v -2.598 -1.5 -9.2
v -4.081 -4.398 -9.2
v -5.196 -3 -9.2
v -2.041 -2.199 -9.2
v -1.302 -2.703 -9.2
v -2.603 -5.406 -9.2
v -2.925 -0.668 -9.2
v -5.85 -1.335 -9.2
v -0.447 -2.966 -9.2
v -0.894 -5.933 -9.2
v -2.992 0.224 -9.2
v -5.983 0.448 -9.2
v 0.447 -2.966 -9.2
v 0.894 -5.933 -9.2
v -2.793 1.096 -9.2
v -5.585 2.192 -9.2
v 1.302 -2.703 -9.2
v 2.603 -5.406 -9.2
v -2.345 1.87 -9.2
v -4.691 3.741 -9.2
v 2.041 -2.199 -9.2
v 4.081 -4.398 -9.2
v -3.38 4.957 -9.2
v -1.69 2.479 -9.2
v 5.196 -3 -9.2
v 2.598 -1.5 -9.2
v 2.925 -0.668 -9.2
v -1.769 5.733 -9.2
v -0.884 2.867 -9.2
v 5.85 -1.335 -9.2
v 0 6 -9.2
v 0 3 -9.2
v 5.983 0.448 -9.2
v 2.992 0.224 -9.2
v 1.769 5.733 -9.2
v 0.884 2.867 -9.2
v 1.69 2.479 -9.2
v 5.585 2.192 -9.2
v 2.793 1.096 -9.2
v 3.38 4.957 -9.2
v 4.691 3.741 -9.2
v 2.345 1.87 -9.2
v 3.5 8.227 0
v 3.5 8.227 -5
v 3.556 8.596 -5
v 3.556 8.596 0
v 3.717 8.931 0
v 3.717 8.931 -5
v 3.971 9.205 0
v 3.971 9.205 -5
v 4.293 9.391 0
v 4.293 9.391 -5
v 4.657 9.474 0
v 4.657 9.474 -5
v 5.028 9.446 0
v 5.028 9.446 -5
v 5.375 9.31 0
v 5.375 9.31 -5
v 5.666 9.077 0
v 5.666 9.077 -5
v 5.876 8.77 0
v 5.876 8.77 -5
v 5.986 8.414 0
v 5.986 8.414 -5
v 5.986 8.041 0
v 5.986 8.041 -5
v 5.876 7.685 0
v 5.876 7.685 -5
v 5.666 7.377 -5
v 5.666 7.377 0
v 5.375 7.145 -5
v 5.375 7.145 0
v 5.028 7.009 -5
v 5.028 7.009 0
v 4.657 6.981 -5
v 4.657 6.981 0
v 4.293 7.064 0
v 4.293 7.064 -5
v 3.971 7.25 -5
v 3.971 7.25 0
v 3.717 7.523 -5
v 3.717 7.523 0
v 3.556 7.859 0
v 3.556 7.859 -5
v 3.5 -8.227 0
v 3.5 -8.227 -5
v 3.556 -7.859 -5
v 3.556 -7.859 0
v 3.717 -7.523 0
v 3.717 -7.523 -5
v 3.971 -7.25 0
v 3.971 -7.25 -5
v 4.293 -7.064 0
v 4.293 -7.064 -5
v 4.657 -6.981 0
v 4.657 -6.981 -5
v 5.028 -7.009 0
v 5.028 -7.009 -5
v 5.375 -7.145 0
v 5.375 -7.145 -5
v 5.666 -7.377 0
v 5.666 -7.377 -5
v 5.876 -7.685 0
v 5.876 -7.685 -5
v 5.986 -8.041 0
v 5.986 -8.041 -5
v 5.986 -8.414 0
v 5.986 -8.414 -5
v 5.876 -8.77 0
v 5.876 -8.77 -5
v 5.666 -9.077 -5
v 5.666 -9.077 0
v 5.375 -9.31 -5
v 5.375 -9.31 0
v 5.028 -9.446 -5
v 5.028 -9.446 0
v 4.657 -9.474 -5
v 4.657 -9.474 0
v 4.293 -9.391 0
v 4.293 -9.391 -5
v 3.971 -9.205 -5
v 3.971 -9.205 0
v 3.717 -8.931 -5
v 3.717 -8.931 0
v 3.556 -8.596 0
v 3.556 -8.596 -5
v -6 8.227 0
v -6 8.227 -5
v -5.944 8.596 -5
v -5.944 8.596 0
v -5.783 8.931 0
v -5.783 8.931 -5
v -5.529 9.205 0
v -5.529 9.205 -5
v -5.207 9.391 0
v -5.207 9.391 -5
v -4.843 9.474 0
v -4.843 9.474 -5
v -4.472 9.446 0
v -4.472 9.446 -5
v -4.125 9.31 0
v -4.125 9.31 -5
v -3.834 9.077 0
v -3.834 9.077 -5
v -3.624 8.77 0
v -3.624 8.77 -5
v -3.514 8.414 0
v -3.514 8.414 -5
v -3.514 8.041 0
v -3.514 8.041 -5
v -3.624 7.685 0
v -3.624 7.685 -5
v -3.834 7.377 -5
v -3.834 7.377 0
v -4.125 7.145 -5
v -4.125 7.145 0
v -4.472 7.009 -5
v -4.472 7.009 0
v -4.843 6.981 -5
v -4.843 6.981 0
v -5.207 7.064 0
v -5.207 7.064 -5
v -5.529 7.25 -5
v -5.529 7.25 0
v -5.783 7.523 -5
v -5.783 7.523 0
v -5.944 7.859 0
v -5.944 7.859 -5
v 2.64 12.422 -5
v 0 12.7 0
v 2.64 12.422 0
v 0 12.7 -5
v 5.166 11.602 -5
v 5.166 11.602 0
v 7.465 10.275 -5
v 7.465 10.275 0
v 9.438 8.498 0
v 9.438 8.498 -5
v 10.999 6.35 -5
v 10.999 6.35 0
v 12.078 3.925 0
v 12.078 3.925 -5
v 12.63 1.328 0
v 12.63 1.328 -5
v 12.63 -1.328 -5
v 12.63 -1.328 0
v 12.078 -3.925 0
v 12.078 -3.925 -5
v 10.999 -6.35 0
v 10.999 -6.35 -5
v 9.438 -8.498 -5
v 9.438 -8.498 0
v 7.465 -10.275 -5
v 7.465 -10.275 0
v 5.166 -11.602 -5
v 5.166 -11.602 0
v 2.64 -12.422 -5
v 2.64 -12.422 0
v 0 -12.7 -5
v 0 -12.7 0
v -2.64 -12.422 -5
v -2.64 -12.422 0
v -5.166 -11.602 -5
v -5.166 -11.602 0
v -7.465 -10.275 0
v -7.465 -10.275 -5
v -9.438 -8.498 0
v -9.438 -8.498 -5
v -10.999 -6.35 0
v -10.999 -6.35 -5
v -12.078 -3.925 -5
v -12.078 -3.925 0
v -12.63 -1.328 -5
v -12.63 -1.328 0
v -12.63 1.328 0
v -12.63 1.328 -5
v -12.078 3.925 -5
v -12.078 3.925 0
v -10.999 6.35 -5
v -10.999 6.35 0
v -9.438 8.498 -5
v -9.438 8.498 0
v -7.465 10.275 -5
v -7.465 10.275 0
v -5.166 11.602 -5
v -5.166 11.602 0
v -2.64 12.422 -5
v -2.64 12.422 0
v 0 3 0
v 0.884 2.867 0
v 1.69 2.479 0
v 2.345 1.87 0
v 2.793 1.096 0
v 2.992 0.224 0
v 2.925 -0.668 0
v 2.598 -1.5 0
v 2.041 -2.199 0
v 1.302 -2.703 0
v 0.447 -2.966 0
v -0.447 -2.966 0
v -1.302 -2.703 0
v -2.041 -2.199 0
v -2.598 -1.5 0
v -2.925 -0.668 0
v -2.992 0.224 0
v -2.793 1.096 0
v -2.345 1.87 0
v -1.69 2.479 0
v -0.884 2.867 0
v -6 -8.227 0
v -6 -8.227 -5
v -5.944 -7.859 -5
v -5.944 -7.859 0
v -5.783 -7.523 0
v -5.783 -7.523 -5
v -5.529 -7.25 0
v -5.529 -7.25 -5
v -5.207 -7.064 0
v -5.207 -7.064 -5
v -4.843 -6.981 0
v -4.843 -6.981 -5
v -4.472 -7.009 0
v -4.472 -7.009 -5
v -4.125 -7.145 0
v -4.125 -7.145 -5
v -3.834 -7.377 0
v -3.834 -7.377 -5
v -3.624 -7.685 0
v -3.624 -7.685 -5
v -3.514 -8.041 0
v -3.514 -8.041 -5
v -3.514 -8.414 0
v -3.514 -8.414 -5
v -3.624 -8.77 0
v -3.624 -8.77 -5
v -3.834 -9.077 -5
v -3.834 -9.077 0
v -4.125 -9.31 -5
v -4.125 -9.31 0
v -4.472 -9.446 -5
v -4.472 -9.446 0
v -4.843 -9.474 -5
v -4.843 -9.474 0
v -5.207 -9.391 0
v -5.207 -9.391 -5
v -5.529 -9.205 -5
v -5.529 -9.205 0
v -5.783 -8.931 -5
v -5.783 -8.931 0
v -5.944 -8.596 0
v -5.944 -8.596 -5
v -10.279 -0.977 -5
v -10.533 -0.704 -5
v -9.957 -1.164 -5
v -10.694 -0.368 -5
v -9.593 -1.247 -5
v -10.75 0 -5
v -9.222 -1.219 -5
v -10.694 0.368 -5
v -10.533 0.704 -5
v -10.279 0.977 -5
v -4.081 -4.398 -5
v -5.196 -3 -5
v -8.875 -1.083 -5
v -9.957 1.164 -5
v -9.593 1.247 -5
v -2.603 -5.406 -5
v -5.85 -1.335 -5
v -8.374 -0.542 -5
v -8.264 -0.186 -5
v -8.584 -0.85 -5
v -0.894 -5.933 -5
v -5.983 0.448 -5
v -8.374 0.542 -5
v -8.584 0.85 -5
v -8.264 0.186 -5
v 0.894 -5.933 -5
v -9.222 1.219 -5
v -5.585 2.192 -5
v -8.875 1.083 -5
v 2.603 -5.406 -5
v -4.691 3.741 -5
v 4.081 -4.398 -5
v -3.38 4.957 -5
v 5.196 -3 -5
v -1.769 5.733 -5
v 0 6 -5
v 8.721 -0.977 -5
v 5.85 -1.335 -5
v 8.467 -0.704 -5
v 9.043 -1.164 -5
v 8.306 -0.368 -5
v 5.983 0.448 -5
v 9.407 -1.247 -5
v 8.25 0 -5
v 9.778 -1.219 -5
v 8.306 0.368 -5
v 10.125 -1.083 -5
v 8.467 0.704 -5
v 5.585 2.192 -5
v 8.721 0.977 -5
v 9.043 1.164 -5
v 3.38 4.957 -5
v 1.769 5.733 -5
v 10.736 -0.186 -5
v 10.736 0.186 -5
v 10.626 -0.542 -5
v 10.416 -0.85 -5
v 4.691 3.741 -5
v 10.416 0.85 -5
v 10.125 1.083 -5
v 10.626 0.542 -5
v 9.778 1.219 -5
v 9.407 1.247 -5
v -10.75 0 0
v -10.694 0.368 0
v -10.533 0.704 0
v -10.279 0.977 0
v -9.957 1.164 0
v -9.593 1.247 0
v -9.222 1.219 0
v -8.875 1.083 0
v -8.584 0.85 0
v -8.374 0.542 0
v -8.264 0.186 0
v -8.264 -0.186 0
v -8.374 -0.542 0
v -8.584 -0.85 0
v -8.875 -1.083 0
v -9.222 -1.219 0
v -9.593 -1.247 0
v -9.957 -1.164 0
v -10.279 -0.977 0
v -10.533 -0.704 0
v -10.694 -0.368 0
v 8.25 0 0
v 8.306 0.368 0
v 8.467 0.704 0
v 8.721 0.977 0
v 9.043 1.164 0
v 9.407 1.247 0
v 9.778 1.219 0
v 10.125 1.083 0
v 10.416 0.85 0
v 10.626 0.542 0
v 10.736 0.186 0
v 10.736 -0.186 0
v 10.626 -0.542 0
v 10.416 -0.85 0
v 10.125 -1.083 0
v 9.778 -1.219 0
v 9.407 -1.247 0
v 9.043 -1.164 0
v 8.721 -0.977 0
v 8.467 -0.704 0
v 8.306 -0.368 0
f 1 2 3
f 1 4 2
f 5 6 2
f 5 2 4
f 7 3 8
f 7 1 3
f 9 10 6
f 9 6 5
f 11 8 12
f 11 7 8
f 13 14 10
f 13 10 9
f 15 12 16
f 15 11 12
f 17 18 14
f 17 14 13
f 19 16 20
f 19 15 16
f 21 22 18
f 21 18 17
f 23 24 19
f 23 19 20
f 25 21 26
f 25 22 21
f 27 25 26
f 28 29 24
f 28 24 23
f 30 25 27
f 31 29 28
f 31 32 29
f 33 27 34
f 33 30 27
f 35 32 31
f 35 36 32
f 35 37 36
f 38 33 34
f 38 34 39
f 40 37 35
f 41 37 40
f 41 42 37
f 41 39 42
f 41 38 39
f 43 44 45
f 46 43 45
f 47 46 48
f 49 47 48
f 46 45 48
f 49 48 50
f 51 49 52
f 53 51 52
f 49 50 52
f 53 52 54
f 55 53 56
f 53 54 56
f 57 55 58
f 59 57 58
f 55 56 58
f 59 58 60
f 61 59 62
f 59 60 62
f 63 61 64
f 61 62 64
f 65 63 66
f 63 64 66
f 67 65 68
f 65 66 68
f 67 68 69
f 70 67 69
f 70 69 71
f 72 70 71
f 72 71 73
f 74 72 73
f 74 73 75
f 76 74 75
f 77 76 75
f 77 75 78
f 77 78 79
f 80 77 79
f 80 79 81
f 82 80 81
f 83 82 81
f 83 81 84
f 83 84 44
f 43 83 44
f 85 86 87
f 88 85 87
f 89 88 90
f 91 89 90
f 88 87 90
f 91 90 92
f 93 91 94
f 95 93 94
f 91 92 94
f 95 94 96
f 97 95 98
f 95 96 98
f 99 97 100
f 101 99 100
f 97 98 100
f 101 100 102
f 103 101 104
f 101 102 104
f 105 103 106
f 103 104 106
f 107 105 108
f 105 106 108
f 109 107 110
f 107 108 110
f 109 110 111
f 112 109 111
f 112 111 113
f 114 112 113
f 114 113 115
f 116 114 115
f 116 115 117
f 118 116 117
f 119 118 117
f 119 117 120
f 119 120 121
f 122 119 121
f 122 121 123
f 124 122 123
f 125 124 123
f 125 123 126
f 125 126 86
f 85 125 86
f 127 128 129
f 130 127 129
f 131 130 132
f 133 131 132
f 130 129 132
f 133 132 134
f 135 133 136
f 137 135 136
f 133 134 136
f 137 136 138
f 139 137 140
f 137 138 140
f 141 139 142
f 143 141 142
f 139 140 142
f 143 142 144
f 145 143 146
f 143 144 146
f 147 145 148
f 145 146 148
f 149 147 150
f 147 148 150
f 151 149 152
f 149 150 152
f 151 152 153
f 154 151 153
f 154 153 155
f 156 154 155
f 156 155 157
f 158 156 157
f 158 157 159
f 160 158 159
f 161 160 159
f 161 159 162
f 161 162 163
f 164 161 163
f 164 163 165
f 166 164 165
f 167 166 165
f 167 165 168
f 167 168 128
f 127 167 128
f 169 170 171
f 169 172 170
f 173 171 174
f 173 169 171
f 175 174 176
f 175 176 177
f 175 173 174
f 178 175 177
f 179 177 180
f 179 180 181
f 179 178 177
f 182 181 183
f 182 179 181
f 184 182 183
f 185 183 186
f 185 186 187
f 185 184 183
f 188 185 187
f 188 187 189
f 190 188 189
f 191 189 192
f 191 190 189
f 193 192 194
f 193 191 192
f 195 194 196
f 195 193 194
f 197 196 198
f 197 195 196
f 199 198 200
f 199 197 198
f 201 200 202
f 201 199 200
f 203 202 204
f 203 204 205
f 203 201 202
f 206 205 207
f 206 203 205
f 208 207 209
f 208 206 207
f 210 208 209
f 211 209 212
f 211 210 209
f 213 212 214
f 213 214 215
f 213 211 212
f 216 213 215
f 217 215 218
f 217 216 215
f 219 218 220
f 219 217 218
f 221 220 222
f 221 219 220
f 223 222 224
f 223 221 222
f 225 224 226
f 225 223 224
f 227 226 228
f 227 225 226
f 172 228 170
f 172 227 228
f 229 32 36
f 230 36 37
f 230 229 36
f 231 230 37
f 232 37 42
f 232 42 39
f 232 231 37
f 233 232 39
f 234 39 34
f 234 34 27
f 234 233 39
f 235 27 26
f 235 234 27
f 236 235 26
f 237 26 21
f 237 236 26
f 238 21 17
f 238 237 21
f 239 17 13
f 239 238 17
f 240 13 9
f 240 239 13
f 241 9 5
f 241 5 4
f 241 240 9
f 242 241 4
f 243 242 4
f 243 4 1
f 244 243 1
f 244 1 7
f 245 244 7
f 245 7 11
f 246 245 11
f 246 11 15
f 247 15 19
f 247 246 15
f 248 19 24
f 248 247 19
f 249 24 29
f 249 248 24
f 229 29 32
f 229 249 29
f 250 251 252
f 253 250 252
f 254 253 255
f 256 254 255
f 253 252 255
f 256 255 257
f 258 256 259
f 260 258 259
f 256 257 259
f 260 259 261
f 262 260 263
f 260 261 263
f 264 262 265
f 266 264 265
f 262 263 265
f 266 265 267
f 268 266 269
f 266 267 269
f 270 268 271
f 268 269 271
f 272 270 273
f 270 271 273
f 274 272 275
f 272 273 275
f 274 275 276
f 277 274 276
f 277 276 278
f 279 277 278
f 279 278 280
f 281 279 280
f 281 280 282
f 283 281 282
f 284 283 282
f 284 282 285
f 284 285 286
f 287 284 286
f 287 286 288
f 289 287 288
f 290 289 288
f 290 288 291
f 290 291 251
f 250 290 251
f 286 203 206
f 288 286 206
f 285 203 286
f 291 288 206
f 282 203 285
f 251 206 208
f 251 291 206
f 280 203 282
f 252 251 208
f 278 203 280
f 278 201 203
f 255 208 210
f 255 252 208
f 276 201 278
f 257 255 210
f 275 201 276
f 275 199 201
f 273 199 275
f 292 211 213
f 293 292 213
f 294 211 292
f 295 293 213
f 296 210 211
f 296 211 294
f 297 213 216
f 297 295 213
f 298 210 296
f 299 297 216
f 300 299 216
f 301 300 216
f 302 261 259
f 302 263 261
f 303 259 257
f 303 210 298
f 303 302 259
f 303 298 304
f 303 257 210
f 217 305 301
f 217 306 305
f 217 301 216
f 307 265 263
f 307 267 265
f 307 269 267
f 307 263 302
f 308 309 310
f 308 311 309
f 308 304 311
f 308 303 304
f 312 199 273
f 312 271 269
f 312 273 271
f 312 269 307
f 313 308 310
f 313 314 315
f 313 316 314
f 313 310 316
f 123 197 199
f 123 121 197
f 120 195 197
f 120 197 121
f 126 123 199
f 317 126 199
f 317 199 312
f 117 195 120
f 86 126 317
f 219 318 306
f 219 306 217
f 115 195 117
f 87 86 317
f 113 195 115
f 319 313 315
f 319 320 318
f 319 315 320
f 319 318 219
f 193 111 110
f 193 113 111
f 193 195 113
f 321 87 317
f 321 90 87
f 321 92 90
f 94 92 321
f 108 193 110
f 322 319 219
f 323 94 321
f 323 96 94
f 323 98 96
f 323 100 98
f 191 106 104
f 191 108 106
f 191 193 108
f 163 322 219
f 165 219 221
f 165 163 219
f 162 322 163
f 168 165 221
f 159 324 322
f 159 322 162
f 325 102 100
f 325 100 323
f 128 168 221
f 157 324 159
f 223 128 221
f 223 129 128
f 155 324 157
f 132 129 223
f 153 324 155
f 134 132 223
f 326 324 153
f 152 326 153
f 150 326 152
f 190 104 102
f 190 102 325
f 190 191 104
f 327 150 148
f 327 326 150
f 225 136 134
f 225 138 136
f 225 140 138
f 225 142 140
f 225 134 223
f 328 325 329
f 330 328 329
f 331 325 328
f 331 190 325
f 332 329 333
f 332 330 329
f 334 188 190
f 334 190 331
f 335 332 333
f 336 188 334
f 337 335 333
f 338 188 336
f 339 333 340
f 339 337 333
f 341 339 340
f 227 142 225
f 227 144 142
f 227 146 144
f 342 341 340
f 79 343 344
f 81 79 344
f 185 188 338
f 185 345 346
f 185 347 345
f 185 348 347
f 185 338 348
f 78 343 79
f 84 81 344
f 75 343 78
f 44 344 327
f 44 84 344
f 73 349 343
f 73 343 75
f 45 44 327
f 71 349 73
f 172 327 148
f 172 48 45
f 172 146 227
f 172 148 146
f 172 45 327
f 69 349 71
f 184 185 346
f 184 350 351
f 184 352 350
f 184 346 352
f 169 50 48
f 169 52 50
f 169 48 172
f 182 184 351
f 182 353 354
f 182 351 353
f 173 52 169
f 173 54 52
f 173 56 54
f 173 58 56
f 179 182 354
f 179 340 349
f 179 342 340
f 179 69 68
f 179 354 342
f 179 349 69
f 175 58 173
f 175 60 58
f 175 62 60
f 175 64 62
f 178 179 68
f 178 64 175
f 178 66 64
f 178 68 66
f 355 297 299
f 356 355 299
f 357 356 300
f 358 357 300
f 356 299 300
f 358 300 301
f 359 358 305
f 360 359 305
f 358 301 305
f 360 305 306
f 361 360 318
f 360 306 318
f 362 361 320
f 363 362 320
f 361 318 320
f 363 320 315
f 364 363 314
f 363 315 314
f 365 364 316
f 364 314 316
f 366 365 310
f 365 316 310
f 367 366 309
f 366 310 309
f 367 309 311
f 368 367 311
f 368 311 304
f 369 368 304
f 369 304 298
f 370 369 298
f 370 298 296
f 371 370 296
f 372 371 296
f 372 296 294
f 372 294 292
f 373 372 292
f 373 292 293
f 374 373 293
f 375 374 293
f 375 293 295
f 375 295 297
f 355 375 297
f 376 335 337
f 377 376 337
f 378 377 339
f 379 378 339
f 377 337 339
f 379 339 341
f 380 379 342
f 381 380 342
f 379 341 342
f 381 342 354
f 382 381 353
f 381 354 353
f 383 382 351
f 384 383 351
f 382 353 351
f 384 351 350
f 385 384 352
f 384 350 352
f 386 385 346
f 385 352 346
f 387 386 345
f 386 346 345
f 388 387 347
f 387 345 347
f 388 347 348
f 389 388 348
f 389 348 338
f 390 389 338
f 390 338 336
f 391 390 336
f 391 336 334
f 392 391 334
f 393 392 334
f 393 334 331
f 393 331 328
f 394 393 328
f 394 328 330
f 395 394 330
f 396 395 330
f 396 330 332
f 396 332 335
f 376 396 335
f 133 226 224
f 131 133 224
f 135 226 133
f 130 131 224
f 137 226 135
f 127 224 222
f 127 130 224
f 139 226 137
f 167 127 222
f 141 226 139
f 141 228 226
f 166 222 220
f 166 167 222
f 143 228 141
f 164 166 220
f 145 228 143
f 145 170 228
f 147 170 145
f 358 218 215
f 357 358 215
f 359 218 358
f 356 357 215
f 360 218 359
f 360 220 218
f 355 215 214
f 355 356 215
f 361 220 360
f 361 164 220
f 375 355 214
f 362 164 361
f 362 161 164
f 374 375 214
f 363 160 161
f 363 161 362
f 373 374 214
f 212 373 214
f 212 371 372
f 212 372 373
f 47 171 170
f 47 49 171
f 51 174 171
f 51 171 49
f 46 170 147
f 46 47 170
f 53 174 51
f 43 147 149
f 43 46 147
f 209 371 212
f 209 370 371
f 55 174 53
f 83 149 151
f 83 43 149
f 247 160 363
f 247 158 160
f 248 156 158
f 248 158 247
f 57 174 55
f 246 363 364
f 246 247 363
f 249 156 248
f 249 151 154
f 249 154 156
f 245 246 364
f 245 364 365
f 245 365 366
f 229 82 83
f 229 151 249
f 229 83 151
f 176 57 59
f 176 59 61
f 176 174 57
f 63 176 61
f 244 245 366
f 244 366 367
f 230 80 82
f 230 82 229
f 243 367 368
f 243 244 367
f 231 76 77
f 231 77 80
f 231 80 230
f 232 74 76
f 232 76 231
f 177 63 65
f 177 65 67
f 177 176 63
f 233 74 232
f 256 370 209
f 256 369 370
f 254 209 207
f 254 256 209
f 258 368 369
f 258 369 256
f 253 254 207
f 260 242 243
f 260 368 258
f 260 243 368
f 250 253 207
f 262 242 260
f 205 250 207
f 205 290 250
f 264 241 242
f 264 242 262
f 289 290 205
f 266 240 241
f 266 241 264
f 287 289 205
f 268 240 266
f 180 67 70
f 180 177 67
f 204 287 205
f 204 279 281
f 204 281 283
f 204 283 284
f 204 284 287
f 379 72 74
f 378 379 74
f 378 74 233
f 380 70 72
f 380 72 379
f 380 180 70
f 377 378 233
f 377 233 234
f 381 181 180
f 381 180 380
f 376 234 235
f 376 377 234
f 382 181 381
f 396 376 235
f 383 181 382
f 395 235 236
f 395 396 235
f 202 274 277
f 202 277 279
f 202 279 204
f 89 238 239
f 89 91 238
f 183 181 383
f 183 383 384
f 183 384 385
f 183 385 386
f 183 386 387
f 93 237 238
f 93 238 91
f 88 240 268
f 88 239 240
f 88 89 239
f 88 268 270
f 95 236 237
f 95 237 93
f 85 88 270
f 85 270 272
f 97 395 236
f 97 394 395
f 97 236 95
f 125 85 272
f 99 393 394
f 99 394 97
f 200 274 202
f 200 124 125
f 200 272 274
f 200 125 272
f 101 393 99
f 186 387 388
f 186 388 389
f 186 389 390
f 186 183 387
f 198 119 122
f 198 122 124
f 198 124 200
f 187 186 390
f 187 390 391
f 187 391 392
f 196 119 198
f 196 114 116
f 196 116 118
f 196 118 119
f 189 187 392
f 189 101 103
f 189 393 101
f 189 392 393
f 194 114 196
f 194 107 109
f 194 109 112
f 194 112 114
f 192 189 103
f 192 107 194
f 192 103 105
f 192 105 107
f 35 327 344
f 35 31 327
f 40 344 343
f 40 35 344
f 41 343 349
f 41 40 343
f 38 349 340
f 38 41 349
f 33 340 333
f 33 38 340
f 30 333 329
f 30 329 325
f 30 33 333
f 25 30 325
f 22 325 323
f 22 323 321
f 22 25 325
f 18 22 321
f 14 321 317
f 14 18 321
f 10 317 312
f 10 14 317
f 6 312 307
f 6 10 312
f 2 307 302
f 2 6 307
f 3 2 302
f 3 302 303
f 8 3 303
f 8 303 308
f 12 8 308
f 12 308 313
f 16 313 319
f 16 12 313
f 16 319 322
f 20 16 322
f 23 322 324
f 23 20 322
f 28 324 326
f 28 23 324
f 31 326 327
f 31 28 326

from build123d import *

# Parameters (mm, degrees)
TAP_DRILL_FOR_M3X0_5_TAP1_D     = 2.5
TAP_DRILL_FOR_M3X0_5_TAP1_DEPTH = 10
TAP_DRILL_FOR_M3X0_5_TAP1_TIP   = 0.751075774


with BuildPart() as part:
    # Sketch1 → Revolve1 (revolve)
    with BuildSketch(Plane(origin=(0, 0, 0), x_dir=(0, 0, -1), z_dir=(1, 0, 0))):
        Polygon((0, 3), (0, 12.7), (5, 12.7), (5, 6), (9.2, 6), (9.2, 3), align=None)
    revolve(axis=Axis((0, 0, 50.268991478), (0, 0, -1)))

    # Tap Drill for M3x0.5 Tap1
    with Locations(Plane.XY):
        with Locations((-4.75, 8.227241336), (4.75, 8.227241336), (9.5, 0), (4.75, -8.227241336), (-4.75, -8.227241336), (-9.5, 0)):
            Hole(TAP_DRILL_FOR_M3X0_5_TAP1_D / 2, depth=TAP_DRILL_FOR_M3X0_5_TAP1_DEPTH)
            with Locations((0, 0, -(TAP_DRILL_FOR_M3X0_5_TAP1_DEPTH + TAP_DRILL_FOR_M3X0_5_TAP1_TIP / 2))):  # 118° drill point
                Cone(0, TAP_DRILL_FOR_M3X0_5_TAP1_D / 2, TAP_DRILL_FOR_M3X0_5_TAP1_TIP, mode=Mode.SUBTRACT)


solid = part.part
